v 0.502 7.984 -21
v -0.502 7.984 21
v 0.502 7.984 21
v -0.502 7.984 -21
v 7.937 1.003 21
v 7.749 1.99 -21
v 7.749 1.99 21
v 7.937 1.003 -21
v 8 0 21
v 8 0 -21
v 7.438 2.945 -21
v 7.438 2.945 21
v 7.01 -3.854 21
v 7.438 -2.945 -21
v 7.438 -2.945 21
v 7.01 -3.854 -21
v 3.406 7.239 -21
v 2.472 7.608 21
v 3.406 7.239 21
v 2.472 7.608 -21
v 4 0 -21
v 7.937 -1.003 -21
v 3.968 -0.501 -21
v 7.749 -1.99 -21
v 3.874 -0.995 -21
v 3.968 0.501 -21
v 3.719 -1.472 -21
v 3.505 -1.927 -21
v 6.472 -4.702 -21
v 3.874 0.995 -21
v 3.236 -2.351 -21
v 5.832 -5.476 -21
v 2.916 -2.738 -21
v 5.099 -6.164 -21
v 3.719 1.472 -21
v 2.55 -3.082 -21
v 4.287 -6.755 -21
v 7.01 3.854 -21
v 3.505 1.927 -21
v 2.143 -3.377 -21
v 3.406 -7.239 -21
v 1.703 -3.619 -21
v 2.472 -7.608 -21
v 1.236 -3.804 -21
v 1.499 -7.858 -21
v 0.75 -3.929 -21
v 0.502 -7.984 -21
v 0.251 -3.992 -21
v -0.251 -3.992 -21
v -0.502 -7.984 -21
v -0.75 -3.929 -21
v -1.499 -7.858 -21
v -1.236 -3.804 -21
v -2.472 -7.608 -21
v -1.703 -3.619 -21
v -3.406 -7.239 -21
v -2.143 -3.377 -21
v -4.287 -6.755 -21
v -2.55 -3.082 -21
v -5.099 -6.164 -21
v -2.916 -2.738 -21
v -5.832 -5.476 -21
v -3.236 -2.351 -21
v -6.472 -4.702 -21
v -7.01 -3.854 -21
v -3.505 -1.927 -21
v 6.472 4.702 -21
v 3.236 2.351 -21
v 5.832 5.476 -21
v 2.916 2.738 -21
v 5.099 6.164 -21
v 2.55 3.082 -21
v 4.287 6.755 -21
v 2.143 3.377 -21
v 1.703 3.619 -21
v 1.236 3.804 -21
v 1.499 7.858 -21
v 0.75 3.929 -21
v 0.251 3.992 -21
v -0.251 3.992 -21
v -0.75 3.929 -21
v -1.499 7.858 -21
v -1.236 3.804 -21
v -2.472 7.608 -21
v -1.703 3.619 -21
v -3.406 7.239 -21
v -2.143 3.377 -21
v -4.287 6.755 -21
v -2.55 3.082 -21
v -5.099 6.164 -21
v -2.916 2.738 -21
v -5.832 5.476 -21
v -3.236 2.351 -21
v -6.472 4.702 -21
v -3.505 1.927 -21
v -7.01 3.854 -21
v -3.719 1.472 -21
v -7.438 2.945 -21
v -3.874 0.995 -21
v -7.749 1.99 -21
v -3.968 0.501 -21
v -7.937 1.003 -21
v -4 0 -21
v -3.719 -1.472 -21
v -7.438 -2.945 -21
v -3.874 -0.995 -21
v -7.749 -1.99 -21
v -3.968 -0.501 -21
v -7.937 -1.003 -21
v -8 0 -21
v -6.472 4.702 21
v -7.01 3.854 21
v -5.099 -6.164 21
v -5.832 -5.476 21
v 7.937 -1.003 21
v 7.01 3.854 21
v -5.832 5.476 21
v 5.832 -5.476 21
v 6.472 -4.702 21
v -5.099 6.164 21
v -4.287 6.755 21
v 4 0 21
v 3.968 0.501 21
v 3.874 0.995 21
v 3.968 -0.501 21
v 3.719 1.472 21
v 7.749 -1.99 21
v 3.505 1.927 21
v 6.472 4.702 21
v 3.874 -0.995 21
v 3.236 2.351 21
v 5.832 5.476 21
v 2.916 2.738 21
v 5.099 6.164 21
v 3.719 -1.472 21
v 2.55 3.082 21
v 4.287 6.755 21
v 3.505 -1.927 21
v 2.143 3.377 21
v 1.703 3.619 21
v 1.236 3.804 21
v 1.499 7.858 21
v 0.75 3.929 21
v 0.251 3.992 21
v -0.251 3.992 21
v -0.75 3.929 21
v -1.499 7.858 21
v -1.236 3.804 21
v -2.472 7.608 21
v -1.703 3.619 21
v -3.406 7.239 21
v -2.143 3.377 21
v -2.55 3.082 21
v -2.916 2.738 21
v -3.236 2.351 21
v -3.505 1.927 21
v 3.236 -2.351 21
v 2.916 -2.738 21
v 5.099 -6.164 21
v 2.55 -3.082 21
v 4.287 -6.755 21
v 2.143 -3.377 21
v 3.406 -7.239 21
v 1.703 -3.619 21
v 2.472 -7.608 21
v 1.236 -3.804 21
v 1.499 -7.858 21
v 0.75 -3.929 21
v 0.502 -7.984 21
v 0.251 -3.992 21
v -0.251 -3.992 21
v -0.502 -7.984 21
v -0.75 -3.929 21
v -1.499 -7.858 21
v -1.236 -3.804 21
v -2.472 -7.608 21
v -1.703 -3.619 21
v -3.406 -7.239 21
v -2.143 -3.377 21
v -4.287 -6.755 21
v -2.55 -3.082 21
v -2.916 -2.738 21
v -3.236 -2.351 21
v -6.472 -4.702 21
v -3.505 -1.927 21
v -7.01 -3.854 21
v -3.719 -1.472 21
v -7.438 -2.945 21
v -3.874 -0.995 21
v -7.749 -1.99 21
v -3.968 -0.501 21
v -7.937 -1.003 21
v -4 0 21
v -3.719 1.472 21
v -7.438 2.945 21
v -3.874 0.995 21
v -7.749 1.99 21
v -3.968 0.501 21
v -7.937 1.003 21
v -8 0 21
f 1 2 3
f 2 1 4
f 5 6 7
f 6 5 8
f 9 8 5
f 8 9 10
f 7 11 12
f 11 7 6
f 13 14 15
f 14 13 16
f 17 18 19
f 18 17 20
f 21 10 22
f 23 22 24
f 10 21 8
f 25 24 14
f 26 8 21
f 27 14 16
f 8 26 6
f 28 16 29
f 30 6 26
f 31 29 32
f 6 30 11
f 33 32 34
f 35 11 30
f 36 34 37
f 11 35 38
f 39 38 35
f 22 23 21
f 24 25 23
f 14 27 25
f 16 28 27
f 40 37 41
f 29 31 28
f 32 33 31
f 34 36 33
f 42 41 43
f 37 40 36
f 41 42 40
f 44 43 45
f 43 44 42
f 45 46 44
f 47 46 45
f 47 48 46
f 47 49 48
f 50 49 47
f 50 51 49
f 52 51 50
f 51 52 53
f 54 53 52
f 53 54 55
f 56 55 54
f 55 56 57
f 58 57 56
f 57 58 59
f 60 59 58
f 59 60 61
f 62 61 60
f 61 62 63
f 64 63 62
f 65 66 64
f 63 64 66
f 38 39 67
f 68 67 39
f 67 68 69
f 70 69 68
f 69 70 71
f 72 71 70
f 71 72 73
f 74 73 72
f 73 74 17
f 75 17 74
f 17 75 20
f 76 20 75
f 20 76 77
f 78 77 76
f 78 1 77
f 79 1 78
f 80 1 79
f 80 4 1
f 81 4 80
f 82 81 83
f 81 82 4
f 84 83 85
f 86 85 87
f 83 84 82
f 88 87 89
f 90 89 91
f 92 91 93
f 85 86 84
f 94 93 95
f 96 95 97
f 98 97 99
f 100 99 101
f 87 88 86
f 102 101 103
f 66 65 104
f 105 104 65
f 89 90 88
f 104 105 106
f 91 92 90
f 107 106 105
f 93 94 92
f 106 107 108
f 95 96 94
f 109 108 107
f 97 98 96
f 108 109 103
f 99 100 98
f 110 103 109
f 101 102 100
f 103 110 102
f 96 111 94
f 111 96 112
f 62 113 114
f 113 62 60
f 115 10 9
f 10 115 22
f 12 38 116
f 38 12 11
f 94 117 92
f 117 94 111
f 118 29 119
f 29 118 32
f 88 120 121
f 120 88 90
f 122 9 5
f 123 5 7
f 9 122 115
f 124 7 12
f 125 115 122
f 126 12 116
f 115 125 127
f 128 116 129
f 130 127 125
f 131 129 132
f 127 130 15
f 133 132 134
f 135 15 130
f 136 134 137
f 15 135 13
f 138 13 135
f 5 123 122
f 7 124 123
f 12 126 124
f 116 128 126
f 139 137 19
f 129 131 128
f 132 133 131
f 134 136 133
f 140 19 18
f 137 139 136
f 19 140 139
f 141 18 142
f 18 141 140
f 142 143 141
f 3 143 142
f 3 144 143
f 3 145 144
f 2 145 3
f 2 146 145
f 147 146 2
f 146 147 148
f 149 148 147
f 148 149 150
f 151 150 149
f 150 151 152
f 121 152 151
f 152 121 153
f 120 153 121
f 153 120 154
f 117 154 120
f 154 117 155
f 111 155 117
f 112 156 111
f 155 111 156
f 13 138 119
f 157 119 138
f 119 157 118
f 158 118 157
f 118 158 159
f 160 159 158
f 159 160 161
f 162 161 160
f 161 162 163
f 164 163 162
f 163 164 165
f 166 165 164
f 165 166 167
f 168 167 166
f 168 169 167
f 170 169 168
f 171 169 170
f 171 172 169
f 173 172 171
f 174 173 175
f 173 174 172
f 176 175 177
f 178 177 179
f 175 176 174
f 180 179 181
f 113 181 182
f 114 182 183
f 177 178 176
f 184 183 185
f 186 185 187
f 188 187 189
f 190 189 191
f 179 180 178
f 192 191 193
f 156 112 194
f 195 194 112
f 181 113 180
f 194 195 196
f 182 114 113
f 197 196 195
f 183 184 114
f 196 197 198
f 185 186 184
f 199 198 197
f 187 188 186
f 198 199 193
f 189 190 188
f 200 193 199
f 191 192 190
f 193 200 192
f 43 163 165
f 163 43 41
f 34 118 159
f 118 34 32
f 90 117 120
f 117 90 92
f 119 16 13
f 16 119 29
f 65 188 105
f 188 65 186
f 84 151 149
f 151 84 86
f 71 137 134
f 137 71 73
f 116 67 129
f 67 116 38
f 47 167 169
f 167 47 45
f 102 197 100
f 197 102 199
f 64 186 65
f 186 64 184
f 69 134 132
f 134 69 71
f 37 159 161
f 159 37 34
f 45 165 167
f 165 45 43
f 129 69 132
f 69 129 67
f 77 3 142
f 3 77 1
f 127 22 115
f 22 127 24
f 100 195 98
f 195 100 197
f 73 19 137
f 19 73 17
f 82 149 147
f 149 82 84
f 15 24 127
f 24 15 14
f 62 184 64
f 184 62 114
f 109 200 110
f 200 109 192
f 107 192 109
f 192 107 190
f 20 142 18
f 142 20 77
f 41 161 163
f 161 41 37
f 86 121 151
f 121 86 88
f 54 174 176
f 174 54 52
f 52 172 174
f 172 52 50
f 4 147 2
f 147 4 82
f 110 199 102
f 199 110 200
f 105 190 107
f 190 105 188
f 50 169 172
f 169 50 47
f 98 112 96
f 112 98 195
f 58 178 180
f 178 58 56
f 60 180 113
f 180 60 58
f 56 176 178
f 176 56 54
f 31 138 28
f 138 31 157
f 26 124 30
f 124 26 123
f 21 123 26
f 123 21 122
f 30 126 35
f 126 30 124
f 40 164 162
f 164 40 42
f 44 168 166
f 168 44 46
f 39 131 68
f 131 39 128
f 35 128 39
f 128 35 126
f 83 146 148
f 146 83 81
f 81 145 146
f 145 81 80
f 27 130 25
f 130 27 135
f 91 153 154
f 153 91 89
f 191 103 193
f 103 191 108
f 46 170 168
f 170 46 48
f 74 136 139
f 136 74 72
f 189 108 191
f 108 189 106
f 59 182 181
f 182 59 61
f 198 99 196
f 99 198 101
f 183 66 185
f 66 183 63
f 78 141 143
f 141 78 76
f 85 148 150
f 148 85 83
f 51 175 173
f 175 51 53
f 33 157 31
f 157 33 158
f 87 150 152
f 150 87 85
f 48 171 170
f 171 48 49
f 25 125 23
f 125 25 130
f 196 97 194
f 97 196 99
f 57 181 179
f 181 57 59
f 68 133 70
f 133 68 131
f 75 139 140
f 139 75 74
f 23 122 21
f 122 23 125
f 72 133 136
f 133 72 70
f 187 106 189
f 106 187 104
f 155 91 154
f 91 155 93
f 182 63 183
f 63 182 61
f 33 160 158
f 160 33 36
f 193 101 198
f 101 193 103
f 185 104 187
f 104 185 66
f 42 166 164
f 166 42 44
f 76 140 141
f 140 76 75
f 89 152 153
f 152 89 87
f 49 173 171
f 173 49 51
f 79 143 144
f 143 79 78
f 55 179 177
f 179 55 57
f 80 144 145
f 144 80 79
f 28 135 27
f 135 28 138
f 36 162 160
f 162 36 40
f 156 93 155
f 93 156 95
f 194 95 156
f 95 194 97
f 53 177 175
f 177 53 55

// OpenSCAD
$fn = 50;


difference() {
	union() {
		translate(v = [0, 0, -21.0000000000]) {
			cylinder(h = 42, r = 8.0000000000);
		}
	}
	union() {
		translate(v = [0, 0, -100.0000000000]) {
			cylinder(h = 200, r = 4.0000000000);
		}
	}
}
